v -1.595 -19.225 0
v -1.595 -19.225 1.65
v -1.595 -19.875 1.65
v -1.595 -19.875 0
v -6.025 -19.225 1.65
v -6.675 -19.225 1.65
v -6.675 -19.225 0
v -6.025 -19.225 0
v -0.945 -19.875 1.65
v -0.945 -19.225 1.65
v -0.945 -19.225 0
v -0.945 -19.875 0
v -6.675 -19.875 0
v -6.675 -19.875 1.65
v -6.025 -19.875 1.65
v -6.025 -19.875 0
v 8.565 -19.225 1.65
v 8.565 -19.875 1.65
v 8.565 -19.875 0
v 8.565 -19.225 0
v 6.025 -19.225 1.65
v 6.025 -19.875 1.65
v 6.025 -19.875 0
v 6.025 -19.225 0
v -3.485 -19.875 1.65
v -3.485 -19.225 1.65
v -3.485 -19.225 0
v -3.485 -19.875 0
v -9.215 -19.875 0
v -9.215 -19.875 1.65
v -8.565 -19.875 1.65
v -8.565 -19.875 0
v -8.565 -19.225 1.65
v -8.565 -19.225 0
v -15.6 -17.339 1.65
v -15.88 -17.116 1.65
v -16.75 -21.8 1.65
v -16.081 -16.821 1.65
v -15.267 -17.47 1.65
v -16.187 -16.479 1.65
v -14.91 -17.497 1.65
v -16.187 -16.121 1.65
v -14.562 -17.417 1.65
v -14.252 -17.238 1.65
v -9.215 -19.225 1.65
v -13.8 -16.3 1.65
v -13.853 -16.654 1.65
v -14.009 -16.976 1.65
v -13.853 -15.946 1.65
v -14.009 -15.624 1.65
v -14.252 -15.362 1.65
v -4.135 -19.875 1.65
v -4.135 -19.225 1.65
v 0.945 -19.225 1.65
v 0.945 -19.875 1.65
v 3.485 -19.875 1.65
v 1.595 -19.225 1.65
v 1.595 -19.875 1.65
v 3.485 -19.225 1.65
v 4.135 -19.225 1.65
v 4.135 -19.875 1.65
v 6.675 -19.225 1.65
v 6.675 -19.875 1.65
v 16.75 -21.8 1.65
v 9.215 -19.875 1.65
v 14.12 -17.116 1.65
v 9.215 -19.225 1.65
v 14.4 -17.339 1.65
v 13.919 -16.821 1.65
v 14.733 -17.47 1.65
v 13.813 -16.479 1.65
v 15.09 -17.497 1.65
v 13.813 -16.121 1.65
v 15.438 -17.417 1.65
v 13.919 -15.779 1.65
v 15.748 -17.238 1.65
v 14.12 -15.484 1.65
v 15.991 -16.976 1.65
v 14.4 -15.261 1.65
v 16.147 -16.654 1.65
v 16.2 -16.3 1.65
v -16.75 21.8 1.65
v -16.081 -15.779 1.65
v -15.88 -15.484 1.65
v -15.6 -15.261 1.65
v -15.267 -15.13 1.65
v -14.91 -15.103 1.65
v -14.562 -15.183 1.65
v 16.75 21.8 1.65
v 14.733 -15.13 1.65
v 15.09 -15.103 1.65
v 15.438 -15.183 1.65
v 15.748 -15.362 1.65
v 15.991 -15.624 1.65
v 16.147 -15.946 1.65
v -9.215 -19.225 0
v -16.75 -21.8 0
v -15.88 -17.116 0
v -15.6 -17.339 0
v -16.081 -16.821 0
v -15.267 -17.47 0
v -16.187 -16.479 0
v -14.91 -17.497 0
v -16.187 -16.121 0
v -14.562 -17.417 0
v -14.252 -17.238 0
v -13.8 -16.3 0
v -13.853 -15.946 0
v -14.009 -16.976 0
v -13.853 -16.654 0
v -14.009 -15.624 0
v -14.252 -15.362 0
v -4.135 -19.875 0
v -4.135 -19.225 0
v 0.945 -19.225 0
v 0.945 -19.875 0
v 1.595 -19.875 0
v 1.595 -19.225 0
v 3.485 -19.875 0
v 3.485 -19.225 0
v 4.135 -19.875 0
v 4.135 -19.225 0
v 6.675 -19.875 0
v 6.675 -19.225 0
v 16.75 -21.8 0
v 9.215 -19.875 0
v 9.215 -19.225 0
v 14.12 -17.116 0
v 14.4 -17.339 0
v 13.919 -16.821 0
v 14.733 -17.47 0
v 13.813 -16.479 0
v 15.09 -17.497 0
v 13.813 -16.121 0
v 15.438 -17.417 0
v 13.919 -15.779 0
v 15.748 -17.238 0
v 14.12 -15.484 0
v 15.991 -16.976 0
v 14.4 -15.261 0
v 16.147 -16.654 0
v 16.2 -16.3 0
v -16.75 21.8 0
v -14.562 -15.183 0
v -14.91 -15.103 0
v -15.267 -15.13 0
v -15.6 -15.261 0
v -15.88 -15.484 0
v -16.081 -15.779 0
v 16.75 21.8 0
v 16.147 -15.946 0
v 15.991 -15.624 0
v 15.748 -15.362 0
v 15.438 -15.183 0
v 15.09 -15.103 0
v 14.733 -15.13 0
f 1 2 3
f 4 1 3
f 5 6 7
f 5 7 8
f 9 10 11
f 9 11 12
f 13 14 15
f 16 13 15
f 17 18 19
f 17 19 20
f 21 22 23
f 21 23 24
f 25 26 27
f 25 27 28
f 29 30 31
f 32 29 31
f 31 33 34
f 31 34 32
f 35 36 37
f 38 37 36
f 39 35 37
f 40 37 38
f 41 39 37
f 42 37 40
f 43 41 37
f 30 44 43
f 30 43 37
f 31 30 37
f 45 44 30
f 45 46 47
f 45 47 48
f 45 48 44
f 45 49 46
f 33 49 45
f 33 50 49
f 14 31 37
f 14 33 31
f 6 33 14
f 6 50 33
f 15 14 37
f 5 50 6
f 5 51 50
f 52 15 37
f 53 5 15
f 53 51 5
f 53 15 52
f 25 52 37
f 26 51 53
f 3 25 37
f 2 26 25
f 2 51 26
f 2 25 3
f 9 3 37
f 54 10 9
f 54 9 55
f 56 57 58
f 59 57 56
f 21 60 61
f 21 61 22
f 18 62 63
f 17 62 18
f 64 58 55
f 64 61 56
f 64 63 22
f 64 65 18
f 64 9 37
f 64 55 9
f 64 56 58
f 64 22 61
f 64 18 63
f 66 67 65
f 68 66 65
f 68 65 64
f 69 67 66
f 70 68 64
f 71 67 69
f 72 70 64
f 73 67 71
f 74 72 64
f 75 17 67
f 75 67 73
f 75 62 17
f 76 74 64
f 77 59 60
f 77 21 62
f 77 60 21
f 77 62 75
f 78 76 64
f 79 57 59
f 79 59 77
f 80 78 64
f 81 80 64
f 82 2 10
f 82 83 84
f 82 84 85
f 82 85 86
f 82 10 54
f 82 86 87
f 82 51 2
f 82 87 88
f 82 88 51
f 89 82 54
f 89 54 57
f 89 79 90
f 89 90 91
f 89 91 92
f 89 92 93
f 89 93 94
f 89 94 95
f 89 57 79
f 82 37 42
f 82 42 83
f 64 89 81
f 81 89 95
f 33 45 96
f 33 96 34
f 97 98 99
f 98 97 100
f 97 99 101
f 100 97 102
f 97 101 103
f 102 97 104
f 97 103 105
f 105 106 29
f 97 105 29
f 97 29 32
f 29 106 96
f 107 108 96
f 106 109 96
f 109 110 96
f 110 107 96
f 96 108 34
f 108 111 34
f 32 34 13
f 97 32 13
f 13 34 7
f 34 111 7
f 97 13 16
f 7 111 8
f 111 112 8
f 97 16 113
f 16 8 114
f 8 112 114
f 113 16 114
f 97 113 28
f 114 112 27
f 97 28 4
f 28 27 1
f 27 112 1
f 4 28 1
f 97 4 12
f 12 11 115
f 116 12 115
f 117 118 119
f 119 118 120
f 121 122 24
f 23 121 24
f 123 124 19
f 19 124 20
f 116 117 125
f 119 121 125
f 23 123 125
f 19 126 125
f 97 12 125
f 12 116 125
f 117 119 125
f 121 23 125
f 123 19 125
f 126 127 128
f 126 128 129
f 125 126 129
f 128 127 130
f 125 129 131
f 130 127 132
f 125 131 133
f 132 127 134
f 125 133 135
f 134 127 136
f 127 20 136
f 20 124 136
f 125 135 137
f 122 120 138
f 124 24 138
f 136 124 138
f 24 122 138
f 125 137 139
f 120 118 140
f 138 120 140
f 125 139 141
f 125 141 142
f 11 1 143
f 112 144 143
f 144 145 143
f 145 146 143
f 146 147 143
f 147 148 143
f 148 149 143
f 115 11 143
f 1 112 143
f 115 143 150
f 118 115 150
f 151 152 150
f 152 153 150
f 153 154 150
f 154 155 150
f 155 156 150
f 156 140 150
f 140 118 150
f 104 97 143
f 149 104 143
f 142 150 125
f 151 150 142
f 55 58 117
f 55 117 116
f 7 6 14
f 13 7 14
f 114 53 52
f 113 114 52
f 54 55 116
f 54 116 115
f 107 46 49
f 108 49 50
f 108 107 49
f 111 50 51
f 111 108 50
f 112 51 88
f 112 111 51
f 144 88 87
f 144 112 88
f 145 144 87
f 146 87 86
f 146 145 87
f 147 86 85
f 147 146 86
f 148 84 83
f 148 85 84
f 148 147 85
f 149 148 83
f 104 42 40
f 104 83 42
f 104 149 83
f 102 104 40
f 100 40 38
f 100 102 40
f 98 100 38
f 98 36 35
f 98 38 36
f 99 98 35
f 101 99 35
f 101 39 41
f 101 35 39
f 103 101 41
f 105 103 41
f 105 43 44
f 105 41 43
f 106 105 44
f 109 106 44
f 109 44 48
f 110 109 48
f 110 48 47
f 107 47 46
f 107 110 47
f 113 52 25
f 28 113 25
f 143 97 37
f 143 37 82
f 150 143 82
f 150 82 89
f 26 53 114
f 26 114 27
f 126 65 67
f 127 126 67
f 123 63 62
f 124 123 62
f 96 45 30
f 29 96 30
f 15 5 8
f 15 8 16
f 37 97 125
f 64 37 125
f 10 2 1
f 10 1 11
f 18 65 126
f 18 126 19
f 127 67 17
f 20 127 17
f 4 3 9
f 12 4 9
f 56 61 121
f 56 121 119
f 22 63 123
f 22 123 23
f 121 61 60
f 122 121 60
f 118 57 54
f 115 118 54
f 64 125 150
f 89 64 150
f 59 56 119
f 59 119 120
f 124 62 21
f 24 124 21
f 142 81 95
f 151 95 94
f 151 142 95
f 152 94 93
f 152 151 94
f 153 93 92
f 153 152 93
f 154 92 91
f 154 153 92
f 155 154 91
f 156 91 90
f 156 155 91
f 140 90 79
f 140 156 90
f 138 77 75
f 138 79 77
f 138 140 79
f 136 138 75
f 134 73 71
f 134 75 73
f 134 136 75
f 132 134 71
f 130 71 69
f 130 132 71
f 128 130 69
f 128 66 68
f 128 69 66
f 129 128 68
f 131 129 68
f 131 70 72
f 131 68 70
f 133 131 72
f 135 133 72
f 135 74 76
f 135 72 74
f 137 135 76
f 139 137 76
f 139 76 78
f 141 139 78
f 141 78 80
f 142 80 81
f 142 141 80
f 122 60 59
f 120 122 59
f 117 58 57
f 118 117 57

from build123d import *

# Parameters (mm, degrees)
SKETCH1_W               = 33.5
SKETCH1_H               = 43.6
BOSS_EXTRUDE1_DEPTH     = 1.65
BOSS_EXTRUDE2_START     = -3.05
SKETCH2_W               = 0.65
SKETCH2_H               = 0.65
BOSS_EXTRUDE2_DEPTH     = 11.55
CUT_EXTRUDE1_START      = -4.05
SKETCH2_2_W             = 0.65
SKETCH2_2_H             = 0.65
CUT_EXTRUDE1_DEPTH      = 13.55
LPATTERN1_COUNT         = 4
LPATTERN1_PITCH         = 2.54
MIRROR1_START           = -4.05
MIRROR1_COPY_1_SKETCH_W = 0.65
MIRROR1_COPY_1_SKETCH_H = 0.65
MIRROR1_COPY_1_DEPTH    = 13.55
MIRROR1_COPY_2_SKETCH_W = 0.65
MIRROR1_COPY_2_SKETCH_H = 0.65
MIRROR1_COPY_2_DEPTH    = 13.55
MIRROR1_COPY_3_SKETCH_W = 0.65
MIRROR1_COPY_3_SKETCH_H = 0.65
MIRROR1_COPY_3_DEPTH    = 13.55
MIRROR1_COPY_4_SKETCH_W = 0.65
MIRROR1_COPY_4_SKETCH_H = 0.65
MIRROR1_COPY_4_DEPTH    = 13.55
SKETCH3_R               = 1.2
CUT_EXTRUDE2_DEPTH      = 2.65


with BuildPart() as part:
    # Sketch1 → Boss-Extrude1 (new body)
    with BuildSketch(Plane.XY):
        Rectangle(SKETCH1_W, SKETCH1_H)
    extrude(amount=BOSS_EXTRUDE1_DEPTH)

    # Sketch2 → Boss-Extrude2 (add)
    with BuildSketch(Plane(origin=(0, 0, 0), x_dir=(-1, 0, 0), z_dir=(0, 0, -1)).offset(BOSS_EXTRUDE2_START)):
        with Locations((-1.27, -19.55)):
            Rectangle(SKETCH2_W, SKETCH2_H)
    boss_extrude2 = extrude(amount=BOSS_EXTRUDE2_DEPTH)

    # Sketch2<2> → Cut-Extrude1 (cut)
    with BuildSketch(Plane(origin=(0, 0, 0), x_dir=(-1, 0, 0), z_dir=(0, 0, -1)).offset(CUT_EXTRUDE1_START)):
        with Locations((-1.27, -19.55)):
            Rectangle(SKETCH2_2_W, SKETCH2_2_H)
    cut_extrude1 = extrude(amount=CUT_EXTRUDE1_DEPTH, mode=Mode.SUBTRACT)

    # LPattern1: Cut-Extrude1 ×4
    with Locations(*[(i * LPATTERN1_PITCH, 0, 0) for i in range(1, LPATTERN1_COUNT)]):
        add(cut_extrude1, mode=Mode.SUBTRACT)

    # Mirror1: Boss-Extrude2 across plane
    add(boss_extrude2.mirror(Plane(origin=(0, 0, 0), x_dir=(0, 0, 1), z_dir=(1, 0, 0))))

    # Mirror1 copy 1 sketch → Mirror1 copy 1 (cut)
    with BuildSketch(Plane(origin=(-2.54, 0, 0), x_dir=(1, 0, 0), z_dir=(0, 0, -1)).offset(MIRROR1_START)):
        with Locations((-1.27, 19.55)):
            Rectangle(MIRROR1_COPY_1_SKETCH_W, MIRROR1_COPY_1_SKETCH_H)
    extrude(amount=MIRROR1_COPY_1_DEPTH, mode=Mode.SUBTRACT)

    # Mirror1 copy 2 sketch → Mirror1 copy 2 (cut)
    with BuildSketch(Plane(origin=(-5.08, 0, 0), x_dir=(1, 0, 0), z_dir=(0, 0, -1)).offset(MIRROR1_START)):
        with Locations((-1.27, 19.55)):
            Rectangle(MIRROR1_COPY_2_SKETCH_W, MIRROR1_COPY_2_SKETCH_H)
    extrude(amount=MIRROR1_COPY_2_DEPTH, mode=Mode.SUBTRACT)

    # Mirror1 copy 3 sketch → Mirror1 copy 3 (cut)
    with BuildSketch(Plane(origin=(-7.62, 0, 0), x_dir=(1, 0, 0), z_dir=(0, 0, -1)).offset(MIRROR1_START)):
        with Locations((-1.27, 19.55)):
            Rectangle(MIRROR1_COPY_3_SKETCH_W, MIRROR1_COPY_3_SKETCH_H)
    extrude(amount=MIRROR1_COPY_3_DEPTH, mode=Mode.SUBTRACT)

    # Mirror1 copy 4 sketch → Mirror1 copy 4 (cut)
    with BuildSketch(Plane(origin=(0, 0, 0), x_dir=(1, 0, 0), z_dir=(0, 0, -1)).offset(MIRROR1_START)):
        with Locations((-1.27, 19.55)):
            Rectangle(MIRROR1_COPY_4_SKETCH_W, MIRROR1_COPY_4_SKETCH_H)
    extrude(amount=MIRROR1_COPY_4_DEPTH, mode=Mode.SUBTRACT)

    # Sketch3 → Cut-Extrude2 (cut, through all)
    with BuildSketch(Plane.XY):
        with Locations((-15, -16.3)):
            Circle(SKETCH3_R)
        with Locations((15, -16.3)):
            Circle(SKETCH3_R)
    extrude(amount=CUT_EXTRUDE2_DEPTH, mode=Mode.SUBTRACT)


solid = part.part
